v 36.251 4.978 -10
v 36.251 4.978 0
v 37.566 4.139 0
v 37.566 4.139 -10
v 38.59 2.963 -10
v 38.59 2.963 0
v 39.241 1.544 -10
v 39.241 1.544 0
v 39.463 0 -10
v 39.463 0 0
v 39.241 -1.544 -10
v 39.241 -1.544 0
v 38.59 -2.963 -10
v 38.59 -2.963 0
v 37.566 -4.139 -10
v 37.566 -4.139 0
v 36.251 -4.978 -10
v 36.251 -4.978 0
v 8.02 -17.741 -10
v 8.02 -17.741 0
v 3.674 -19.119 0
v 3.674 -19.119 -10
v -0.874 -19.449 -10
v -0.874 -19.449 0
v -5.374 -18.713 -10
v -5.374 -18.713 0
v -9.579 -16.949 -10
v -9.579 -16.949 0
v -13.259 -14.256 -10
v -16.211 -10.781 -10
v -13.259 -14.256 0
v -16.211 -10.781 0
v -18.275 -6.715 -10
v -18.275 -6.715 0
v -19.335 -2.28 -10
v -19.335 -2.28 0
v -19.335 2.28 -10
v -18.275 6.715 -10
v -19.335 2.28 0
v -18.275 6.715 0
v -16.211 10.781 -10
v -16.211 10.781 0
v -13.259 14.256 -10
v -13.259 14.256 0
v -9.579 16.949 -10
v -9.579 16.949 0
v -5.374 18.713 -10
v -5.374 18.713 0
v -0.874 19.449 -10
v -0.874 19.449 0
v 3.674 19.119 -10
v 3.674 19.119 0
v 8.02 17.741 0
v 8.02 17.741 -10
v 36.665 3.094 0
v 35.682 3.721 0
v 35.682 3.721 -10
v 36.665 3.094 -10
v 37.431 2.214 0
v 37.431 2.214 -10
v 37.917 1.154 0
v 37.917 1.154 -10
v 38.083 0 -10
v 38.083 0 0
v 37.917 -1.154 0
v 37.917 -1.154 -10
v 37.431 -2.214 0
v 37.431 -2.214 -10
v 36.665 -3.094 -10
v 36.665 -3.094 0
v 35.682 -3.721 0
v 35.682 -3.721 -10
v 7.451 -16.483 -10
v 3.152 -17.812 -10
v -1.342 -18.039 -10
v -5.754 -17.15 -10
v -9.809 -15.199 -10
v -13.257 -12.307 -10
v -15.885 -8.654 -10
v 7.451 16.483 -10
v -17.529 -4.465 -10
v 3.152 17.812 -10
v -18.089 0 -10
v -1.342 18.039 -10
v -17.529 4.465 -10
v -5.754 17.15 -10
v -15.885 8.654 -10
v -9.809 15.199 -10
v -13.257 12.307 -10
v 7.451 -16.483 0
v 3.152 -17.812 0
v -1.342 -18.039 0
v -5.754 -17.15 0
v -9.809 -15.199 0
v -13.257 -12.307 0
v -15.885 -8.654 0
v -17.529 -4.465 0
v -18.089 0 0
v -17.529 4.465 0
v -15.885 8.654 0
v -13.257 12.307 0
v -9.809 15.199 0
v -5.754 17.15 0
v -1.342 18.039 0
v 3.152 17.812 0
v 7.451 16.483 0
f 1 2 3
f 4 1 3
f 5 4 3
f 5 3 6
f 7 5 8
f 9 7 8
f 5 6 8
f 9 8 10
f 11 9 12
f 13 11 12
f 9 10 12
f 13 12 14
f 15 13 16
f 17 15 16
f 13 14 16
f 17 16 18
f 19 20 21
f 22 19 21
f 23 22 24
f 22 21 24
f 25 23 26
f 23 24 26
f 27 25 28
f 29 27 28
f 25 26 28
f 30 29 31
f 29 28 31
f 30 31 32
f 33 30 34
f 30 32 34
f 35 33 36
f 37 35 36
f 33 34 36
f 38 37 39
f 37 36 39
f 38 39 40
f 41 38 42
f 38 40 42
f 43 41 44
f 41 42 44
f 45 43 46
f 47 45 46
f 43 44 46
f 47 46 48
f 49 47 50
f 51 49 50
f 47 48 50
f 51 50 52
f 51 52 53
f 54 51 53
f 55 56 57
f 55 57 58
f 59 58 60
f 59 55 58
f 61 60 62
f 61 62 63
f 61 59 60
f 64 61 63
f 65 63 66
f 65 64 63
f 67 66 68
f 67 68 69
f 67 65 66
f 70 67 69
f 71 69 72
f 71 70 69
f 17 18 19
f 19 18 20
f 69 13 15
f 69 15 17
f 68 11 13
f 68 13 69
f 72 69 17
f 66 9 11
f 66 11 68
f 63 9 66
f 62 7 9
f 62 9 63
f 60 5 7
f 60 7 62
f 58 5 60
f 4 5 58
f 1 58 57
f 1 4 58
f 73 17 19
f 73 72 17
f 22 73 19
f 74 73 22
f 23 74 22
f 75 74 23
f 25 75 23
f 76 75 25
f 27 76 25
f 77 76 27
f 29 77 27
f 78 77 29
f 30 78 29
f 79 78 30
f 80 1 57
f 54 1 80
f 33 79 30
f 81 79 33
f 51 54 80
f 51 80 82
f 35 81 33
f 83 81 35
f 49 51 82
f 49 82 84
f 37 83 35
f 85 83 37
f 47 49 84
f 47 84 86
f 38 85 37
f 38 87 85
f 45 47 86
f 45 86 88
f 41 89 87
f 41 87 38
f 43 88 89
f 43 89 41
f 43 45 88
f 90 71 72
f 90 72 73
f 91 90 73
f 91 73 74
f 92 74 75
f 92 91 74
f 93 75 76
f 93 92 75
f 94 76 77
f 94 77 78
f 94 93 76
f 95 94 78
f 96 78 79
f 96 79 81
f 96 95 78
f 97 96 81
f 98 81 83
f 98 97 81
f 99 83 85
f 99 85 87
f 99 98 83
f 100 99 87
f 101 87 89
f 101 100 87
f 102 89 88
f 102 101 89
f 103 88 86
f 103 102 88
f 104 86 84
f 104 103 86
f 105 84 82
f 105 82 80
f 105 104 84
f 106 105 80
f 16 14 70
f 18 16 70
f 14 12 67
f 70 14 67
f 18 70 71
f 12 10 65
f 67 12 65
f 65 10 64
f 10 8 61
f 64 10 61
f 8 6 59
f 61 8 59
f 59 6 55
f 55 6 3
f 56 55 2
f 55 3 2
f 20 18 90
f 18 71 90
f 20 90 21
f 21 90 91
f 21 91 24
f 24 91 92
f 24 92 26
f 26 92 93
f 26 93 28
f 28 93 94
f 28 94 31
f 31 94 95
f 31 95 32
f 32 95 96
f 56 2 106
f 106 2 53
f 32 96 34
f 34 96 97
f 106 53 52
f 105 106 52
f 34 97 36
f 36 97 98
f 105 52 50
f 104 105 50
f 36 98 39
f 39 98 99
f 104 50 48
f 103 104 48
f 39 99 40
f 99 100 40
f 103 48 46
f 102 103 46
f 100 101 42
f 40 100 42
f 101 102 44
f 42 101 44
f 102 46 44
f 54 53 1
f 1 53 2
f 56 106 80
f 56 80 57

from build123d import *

# Parameters (mm, degrees)
EXTRUDE_1_DEPTH = 10


with BuildPart() as part:
    # Эскиз1 → Бобышка-Вытянуть1 (new body)
    with BuildSketch(Plane.XY):
        with BuildLine():
            Line((8.019912069, 17.740535298), (36.250564664, 4.978386487))
            ThreePointArc((36.250564664, 4.978386487), (39.463458, 0), (36.250564664, -4.978386487))
            Line((36.250564664, -4.978386487), (8.019912069, -17.740535298))
            ThreePointArc((8.019912069, -17.740535298), (-19.469093, 0), (8.019912069, 17.740535298))
        make_face()
        with BuildLine():
            Line((35.682100655, -3.720909381), (7.45144806, -16.483058192))
            ThreePointArc((7.45144806, -16.483058192), (-18.089093, 0), (7.45144806, 16.483058192))
            Line((7.45144806, 16.483058192), (35.682100655, 3.720909381))
            ThreePointArc((35.682100655, 3.720909381), (38.083458, 0), (35.682100655, -3.720909381))
        make_face(mode=Mode.SUBTRACT)
    extrude(amount=-EXTRUDE_1_DEPTH)


solid = part.part
